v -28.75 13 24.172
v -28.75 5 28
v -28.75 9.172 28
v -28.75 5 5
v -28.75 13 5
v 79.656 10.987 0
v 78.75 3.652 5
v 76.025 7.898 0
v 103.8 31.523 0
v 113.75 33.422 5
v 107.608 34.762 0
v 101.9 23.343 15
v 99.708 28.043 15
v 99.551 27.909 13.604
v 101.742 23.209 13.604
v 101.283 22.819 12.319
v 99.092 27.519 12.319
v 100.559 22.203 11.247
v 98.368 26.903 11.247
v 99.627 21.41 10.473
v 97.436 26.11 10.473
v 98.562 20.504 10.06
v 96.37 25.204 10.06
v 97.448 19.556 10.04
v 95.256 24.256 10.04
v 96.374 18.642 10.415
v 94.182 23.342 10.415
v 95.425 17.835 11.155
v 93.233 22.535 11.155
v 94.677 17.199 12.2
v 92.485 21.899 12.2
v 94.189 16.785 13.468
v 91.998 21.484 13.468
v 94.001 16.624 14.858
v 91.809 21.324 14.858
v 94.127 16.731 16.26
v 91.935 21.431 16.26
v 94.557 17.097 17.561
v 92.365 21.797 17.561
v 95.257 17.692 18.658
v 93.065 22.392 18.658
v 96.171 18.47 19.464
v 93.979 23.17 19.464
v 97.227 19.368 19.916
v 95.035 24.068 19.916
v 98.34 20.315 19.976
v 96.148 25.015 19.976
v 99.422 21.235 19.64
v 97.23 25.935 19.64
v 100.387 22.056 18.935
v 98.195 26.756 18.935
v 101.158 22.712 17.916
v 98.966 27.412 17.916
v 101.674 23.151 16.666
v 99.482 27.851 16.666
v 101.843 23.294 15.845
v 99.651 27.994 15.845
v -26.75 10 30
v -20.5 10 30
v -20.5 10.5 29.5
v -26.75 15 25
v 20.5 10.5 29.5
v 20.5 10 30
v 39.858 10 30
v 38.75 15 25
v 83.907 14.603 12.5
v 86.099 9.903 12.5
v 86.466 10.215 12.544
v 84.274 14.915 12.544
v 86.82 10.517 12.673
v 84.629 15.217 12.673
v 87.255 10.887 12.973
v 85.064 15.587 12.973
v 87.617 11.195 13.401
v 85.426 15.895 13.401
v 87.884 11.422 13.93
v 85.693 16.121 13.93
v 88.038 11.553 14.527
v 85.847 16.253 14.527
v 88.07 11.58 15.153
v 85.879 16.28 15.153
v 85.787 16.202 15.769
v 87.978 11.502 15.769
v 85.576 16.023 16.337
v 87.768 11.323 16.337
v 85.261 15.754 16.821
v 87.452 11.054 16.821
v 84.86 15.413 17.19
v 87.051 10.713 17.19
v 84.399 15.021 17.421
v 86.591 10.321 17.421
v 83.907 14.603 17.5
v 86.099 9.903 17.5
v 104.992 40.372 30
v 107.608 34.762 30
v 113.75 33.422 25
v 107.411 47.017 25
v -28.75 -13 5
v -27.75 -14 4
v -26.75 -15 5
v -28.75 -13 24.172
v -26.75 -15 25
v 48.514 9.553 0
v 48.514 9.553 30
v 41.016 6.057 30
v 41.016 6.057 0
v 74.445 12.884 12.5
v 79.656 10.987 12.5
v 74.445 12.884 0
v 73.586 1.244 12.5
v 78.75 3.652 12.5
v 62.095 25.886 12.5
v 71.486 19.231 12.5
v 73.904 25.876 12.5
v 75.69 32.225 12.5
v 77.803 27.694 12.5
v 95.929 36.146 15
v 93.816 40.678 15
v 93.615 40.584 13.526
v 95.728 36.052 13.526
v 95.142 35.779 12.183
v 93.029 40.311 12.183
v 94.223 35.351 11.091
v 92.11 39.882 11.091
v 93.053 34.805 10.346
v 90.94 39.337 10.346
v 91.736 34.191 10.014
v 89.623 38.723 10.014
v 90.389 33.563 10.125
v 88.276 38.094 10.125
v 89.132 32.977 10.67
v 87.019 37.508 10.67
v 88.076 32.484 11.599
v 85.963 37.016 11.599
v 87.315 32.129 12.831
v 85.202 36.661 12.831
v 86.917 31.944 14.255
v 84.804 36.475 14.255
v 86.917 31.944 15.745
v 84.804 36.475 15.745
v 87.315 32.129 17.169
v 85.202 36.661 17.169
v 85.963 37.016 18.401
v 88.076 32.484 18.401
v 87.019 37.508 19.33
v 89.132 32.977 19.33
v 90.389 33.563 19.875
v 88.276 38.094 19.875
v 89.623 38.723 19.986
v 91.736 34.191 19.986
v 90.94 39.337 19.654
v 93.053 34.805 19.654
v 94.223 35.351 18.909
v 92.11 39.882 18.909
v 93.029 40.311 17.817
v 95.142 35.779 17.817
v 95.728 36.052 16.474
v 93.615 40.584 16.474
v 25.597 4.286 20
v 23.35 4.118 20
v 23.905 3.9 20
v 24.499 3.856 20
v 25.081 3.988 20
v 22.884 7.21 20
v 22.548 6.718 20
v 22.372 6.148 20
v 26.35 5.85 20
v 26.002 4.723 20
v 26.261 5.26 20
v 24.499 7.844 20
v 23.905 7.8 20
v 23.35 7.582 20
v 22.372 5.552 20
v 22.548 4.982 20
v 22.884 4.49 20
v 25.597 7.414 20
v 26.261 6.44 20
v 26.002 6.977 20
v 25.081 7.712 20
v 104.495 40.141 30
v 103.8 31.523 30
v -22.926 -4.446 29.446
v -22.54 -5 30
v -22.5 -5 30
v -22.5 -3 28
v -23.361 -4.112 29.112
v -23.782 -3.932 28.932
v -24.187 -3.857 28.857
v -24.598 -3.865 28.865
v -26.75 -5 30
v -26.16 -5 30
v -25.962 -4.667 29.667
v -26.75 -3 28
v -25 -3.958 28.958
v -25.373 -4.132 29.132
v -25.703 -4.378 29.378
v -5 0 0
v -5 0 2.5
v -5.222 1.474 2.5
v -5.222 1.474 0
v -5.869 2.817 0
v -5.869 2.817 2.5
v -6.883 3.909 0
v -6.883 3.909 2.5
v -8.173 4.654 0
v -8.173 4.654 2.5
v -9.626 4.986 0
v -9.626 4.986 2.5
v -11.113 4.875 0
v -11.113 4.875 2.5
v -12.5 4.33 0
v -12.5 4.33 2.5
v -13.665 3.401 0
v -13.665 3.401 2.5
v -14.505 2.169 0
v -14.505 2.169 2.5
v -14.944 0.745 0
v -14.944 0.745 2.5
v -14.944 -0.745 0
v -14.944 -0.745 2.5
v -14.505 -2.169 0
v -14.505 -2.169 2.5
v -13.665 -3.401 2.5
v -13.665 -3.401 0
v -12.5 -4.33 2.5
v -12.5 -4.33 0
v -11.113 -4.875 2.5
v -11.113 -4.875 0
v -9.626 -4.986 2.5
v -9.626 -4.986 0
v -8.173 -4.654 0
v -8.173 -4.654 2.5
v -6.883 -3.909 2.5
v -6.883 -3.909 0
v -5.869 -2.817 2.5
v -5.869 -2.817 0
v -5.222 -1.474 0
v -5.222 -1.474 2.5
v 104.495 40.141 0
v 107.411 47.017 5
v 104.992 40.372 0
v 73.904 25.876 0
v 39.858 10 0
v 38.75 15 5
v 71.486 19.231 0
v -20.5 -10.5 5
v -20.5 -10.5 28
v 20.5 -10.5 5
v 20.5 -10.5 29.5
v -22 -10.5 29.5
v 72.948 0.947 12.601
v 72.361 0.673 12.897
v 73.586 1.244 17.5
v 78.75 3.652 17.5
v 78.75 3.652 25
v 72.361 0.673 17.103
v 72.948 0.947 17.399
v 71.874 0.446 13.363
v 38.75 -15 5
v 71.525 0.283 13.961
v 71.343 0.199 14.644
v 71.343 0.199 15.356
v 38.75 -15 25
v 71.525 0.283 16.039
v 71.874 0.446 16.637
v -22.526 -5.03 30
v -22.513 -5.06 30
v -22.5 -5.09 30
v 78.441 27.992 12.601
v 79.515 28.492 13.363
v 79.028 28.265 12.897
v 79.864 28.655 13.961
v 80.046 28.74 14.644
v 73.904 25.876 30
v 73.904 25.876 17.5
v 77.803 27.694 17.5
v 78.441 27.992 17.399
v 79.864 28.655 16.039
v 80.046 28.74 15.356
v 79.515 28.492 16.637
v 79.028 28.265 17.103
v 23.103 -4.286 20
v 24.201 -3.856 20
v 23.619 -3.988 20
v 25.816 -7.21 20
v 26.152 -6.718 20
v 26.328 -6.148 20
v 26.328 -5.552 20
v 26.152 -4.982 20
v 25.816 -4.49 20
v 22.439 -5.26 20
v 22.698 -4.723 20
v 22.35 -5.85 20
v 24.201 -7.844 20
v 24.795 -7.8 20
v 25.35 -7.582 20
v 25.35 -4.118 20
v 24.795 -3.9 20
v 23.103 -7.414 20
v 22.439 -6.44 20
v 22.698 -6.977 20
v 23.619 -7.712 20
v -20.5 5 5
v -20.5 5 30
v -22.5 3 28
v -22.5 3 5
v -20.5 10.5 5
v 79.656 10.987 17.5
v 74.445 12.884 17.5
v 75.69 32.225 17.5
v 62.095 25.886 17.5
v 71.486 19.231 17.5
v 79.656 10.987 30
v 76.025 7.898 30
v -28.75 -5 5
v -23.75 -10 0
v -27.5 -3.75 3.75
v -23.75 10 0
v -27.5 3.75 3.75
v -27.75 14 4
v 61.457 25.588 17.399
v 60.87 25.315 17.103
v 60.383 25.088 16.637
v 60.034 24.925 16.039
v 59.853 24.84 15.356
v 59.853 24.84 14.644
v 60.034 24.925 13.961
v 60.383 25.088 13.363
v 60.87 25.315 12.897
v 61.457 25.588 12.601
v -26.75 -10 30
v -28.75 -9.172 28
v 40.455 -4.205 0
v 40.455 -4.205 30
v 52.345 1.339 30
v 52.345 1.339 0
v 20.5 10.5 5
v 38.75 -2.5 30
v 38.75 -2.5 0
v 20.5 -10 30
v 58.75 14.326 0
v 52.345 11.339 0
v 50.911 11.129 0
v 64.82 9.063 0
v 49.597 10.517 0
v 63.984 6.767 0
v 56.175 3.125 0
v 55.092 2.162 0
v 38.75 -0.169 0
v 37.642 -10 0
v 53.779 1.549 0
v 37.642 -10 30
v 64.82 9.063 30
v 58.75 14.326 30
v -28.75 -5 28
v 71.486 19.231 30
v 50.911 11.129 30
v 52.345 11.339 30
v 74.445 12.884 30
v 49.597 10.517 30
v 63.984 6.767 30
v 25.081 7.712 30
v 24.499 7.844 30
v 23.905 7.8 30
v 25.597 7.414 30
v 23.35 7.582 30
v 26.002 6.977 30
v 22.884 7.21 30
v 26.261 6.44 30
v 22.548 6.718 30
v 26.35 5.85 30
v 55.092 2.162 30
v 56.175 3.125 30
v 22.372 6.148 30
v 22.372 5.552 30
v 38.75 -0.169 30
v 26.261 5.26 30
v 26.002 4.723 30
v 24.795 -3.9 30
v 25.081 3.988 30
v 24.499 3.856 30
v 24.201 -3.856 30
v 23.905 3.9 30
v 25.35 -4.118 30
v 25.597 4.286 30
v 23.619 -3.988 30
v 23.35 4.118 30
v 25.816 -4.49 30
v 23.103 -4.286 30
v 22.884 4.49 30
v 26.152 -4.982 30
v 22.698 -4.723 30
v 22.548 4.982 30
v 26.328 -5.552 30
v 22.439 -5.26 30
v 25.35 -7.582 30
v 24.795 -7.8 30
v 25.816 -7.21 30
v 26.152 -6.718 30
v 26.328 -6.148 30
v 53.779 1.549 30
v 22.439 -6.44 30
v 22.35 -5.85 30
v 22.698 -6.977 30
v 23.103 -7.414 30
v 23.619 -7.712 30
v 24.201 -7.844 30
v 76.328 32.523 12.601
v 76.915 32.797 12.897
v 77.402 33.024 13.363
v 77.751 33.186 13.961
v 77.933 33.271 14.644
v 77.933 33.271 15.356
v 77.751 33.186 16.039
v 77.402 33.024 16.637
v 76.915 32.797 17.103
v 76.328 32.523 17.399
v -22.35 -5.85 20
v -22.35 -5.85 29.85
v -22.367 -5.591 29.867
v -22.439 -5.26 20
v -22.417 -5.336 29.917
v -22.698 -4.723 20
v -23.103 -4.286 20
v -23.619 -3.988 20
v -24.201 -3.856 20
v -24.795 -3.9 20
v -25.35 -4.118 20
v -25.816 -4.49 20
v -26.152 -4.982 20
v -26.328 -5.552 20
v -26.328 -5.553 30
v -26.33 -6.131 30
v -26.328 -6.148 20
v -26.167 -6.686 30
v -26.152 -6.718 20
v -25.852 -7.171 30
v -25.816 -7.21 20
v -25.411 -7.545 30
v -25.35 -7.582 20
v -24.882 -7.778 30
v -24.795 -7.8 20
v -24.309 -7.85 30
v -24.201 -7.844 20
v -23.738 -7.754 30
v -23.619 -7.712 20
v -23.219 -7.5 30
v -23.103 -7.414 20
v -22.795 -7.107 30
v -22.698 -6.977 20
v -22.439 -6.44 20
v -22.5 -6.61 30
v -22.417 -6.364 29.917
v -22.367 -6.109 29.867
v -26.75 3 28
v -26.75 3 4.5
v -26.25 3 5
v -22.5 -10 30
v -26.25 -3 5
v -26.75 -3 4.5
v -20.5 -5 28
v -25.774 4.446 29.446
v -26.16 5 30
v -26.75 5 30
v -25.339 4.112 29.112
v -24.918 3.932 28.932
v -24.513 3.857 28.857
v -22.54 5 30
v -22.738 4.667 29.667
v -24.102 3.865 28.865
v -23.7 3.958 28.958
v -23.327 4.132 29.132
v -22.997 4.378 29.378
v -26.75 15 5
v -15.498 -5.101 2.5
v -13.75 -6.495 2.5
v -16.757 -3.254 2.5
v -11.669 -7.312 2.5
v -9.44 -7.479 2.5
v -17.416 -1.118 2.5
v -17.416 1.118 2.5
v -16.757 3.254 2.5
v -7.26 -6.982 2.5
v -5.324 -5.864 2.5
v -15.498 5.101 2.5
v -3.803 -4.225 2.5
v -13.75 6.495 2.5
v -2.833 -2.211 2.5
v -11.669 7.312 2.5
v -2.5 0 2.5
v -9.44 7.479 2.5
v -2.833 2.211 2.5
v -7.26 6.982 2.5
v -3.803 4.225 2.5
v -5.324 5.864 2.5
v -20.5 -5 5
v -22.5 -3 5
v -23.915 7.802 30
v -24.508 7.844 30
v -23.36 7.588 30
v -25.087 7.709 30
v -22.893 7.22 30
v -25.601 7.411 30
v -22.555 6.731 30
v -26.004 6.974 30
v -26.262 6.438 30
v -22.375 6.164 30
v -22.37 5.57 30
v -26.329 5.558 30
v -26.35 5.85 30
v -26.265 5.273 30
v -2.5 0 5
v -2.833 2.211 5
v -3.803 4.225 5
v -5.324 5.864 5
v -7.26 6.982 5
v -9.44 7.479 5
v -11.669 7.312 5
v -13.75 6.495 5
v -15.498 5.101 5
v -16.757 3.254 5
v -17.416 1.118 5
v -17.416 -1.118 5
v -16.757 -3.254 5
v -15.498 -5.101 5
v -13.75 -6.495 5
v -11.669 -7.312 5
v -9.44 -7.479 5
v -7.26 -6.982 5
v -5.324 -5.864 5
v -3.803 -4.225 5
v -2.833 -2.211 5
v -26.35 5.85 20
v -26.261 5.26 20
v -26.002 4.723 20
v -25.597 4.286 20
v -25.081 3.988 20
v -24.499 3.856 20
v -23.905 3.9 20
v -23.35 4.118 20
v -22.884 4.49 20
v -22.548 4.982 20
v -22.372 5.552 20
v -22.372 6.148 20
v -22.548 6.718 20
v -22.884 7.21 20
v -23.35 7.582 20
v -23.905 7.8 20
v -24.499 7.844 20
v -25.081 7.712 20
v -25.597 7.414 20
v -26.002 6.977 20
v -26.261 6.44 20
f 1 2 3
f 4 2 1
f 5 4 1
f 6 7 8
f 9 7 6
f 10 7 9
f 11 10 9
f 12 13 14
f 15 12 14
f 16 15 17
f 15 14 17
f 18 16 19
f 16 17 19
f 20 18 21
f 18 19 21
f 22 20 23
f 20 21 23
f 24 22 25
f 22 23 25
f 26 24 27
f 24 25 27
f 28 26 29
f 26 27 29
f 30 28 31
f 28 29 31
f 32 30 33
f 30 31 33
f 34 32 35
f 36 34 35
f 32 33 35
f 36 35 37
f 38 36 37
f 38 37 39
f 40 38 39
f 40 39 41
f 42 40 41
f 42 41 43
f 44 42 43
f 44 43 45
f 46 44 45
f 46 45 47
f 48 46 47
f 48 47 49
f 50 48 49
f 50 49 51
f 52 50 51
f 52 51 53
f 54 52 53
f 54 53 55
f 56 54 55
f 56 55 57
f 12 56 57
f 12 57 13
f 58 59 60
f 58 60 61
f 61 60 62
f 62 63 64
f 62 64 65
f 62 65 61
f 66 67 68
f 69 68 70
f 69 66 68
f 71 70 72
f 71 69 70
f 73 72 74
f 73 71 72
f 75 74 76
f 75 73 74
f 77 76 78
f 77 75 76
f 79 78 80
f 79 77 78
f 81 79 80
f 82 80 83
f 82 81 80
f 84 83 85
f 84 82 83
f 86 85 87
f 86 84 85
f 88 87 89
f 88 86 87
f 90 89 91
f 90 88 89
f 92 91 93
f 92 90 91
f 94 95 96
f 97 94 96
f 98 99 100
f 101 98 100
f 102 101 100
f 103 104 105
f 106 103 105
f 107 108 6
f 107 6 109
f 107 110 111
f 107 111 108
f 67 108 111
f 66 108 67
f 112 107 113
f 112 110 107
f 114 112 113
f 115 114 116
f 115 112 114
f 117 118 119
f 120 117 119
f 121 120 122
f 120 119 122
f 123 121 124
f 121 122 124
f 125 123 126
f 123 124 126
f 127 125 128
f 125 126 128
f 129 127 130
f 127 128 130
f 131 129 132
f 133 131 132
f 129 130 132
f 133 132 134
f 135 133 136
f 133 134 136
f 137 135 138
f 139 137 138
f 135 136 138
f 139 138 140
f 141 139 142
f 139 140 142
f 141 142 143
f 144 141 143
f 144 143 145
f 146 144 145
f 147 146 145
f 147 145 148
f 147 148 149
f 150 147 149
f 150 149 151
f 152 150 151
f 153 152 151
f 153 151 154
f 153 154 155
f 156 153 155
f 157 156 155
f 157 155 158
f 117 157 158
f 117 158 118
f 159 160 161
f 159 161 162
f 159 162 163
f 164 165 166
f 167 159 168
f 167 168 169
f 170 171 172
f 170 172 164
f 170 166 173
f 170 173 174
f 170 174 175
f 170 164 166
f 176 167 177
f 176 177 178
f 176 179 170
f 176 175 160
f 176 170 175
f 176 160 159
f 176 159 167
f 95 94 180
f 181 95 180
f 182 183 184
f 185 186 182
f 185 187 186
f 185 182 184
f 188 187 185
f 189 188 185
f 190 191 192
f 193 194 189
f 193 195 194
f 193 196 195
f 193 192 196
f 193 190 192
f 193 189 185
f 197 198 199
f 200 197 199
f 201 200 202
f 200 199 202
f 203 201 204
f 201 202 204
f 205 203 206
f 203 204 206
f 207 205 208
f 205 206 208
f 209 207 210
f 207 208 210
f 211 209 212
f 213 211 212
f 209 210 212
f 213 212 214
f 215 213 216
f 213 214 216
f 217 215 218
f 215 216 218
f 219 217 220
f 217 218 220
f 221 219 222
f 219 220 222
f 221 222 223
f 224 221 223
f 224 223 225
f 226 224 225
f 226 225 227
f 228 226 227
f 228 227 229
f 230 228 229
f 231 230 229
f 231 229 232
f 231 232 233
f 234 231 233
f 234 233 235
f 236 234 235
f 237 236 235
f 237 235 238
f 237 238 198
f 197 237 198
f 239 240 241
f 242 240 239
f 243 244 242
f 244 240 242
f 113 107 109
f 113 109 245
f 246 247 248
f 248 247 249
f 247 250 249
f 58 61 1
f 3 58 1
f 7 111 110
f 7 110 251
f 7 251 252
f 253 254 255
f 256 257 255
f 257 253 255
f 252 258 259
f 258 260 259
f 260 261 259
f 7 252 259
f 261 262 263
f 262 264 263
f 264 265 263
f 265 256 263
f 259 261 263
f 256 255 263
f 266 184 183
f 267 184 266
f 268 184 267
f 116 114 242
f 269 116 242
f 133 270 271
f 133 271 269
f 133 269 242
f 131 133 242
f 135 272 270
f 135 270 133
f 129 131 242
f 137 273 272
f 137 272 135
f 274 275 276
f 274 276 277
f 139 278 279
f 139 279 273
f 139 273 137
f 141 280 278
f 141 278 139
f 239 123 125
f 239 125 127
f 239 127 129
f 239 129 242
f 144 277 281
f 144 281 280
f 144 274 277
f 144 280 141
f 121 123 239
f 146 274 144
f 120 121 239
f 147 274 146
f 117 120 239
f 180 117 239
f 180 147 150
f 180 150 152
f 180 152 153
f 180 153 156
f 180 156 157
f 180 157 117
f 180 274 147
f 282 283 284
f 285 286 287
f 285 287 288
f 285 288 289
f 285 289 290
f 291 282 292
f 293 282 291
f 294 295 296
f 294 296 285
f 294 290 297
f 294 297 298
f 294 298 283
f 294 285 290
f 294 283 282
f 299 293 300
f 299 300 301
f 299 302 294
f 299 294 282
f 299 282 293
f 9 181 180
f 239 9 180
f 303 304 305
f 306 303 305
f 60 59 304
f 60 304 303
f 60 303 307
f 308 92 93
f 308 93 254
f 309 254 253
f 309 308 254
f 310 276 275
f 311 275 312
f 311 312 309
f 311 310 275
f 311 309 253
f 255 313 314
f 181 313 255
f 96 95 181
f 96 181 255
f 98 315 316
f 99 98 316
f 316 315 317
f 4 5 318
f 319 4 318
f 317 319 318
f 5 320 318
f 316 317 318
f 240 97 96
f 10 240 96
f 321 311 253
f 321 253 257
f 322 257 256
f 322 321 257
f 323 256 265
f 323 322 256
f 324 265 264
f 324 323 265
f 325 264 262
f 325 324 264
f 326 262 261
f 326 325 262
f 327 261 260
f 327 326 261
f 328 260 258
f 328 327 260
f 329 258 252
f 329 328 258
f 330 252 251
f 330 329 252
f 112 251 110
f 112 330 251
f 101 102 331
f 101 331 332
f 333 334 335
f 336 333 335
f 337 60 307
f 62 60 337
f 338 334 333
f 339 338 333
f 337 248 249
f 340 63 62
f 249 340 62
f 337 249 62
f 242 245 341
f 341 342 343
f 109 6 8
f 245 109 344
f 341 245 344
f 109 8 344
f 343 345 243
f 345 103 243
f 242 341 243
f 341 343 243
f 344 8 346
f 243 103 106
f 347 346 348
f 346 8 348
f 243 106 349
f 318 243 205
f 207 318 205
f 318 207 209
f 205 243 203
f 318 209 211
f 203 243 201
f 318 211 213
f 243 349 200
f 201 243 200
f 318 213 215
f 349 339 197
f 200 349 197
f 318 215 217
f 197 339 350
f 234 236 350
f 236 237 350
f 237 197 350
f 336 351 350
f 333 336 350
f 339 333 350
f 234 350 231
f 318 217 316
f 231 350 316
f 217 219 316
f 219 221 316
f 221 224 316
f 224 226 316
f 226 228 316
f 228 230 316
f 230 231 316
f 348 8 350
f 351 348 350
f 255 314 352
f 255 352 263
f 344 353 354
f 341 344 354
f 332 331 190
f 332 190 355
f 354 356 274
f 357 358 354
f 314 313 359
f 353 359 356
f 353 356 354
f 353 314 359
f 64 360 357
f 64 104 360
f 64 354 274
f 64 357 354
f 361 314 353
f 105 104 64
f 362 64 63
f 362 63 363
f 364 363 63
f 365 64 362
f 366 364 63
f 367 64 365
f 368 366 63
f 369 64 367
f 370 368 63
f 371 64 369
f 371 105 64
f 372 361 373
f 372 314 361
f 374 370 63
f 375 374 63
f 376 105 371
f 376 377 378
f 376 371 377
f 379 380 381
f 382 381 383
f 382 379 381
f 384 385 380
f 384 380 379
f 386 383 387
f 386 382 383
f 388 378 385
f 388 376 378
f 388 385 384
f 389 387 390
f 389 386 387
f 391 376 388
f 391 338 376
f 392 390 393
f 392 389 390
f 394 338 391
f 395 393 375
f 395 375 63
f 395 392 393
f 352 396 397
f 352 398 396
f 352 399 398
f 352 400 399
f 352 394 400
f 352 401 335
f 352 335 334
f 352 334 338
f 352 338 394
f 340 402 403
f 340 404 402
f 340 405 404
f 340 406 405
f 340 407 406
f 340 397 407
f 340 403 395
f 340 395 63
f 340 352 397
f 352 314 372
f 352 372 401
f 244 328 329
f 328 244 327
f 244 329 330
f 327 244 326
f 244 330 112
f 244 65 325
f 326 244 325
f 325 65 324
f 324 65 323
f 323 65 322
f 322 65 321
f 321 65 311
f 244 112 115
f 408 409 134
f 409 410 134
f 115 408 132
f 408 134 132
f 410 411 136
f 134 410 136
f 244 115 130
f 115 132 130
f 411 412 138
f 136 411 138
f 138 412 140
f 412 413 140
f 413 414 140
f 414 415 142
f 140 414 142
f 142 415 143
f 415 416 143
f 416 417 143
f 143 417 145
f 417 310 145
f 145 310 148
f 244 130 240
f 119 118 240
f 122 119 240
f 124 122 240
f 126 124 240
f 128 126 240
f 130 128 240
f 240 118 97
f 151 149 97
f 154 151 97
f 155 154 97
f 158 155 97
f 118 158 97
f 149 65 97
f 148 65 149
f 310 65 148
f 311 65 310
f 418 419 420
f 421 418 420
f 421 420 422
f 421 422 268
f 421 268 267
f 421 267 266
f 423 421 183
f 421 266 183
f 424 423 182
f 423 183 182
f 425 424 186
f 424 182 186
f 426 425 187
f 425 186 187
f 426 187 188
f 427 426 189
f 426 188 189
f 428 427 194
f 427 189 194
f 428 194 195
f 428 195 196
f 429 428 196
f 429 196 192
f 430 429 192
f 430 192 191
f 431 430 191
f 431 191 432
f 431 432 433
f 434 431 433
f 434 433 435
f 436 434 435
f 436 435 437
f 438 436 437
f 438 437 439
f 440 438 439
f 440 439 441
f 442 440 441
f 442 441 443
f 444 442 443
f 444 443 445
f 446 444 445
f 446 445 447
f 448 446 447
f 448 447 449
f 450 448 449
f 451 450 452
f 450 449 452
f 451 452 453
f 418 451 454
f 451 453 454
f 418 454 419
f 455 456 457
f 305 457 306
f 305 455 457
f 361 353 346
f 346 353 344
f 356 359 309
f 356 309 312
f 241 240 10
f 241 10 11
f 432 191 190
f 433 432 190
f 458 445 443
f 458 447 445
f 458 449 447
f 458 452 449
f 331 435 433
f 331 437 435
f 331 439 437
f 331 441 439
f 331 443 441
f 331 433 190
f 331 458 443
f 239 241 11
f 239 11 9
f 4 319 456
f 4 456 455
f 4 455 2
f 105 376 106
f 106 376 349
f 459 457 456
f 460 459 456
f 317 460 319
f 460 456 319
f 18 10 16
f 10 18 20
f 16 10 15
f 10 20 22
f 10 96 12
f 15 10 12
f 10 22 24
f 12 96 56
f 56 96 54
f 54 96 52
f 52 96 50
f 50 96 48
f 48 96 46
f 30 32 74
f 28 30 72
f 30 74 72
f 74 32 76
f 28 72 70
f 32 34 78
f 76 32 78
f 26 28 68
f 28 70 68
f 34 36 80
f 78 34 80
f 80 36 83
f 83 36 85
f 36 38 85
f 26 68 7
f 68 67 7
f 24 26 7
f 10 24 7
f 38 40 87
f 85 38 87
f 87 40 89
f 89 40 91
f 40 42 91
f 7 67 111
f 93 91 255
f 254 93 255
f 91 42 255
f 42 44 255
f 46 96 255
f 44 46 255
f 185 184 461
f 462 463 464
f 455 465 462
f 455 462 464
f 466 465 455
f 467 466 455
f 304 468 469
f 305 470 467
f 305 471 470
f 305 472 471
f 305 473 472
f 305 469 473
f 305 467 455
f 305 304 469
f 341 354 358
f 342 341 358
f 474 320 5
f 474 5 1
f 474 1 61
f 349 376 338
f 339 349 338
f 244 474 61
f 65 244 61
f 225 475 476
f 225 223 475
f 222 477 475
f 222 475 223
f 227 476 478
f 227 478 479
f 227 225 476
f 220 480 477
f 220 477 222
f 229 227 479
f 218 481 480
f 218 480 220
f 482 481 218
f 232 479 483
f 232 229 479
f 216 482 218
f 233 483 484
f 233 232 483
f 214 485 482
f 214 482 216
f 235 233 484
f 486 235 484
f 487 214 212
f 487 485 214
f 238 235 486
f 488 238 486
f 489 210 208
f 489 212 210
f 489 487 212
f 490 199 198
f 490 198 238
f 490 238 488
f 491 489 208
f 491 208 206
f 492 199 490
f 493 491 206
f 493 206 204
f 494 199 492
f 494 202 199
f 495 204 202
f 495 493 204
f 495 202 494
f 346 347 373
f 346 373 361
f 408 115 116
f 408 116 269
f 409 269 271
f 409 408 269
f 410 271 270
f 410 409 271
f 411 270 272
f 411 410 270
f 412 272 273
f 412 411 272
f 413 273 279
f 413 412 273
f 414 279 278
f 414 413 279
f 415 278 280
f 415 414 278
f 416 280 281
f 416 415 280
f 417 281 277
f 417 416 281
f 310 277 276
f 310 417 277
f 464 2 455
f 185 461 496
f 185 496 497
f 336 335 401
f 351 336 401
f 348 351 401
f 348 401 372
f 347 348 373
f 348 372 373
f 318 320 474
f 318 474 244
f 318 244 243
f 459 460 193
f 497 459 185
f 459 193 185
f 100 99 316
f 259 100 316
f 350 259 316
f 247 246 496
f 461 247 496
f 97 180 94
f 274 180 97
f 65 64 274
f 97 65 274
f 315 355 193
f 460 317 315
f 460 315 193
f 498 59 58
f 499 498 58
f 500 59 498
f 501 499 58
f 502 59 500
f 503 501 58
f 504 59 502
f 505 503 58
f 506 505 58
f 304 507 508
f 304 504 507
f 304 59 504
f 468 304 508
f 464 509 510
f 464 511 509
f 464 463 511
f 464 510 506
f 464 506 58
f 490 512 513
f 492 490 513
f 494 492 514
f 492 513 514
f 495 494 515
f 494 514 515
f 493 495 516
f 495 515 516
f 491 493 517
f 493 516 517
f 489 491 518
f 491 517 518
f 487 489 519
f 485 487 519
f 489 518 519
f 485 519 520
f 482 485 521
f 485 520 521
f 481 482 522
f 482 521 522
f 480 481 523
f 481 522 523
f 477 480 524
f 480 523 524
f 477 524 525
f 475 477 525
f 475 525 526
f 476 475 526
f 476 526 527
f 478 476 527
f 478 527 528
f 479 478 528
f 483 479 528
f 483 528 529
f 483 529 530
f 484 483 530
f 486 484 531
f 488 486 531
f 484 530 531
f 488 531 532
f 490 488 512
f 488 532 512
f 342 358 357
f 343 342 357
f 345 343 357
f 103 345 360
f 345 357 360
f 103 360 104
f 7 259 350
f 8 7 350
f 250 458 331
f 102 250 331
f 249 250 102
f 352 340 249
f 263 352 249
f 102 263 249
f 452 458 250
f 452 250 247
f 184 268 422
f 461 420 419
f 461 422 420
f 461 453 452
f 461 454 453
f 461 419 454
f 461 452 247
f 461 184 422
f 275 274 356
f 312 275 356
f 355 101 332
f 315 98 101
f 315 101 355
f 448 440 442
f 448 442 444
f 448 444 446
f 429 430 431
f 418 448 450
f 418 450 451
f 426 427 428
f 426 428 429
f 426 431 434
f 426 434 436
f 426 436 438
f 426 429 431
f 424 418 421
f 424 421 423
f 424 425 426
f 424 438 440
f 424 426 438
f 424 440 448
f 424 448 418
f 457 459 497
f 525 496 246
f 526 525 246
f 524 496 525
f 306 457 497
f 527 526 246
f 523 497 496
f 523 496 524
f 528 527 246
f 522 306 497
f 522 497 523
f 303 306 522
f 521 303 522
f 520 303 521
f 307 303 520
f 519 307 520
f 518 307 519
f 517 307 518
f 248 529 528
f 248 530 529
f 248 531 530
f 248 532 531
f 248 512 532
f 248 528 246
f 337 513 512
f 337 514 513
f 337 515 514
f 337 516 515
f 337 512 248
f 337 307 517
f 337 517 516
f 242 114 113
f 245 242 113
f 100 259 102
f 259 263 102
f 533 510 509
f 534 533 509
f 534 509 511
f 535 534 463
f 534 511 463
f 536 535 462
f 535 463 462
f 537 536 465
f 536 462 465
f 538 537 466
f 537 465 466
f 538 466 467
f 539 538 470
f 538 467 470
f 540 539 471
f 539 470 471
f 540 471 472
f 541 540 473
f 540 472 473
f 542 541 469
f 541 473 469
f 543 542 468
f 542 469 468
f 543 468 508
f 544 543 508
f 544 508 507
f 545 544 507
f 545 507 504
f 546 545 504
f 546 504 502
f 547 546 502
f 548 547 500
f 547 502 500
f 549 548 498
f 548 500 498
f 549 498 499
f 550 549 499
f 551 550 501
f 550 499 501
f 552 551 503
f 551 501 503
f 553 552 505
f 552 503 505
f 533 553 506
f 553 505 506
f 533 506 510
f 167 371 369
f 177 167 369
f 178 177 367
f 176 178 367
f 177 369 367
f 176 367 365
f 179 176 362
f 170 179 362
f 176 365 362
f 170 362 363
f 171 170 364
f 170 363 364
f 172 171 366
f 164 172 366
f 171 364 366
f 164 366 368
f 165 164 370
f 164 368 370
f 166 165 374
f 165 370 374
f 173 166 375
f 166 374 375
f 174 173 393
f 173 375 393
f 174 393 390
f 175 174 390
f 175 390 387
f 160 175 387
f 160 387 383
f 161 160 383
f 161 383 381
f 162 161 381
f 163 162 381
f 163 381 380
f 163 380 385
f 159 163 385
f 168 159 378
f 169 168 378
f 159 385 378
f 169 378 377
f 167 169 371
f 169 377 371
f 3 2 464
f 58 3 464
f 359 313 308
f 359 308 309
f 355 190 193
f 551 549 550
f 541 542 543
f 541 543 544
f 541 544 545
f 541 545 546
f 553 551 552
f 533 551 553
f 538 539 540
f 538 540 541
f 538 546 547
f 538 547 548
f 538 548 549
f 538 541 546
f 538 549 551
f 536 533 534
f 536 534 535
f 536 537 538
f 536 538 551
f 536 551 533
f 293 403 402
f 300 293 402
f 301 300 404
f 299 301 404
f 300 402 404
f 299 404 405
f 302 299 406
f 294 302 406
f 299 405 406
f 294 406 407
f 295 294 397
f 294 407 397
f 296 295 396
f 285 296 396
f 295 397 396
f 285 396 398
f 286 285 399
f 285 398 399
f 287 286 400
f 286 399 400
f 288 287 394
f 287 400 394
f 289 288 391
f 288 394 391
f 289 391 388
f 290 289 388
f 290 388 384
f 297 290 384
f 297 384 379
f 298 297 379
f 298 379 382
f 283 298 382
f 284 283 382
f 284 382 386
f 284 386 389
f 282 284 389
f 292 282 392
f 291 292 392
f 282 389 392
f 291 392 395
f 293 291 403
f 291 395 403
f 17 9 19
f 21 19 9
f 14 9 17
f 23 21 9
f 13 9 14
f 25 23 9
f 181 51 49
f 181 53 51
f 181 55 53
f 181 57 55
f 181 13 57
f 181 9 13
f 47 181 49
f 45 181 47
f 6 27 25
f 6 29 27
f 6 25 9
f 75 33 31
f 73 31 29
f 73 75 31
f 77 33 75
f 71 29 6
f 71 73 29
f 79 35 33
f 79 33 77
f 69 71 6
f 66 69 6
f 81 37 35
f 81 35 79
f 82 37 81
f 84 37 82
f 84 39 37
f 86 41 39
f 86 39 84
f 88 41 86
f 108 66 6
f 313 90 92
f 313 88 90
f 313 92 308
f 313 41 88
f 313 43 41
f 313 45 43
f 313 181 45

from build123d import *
from OCP.BRepFilletAPI import BRepFilletAPI_MakeChamfer

# Parameters (mm, degrees)
SKETCH1_W           = 57.5
SKETCH1_H           = 30
BOSS_EXTRUDE1_DEPTH = 30
SKETCH2_W           = 41
SKETCH2_H           = 21
CUT_EXTRUDE1_DEPTH  = 25
SKETCH8_R           = 2
CUT_EXTRUDE6_DEPTH  = 10
SKETCH9_W           = 8.25
SKETCH9_H           = 6
CUT_EXTRUDE7_DEPTH  = 25
SKETCH10_R          = 5
CUT_EXTRUDE8_DEPTH  = 10
BOSS_EXTRUDE4_DEPTH = 30
CUT_EXTRUDE9_DEPTH  = 30
CHAMFER3_SIZE       = 5
CHAMFER3_SIZE_2     = 7.15419636
CHAMFER3_SIZE_3     = 4.066852786
SKETCH16_R          = 5
CUT_EXTRUDE10_DEPTH = 30
CHAMFER5_SIZE       = 5
CHAMFER6_SIZE       = 2
CHAMFER7_SIZE       = 2.5
CHAMFER7_SIZE_2     = 1.767766953
CHAMFER8_SIZE       = 2.5
CHAMFER8_SIZE2      = 1.892599607
CHAMFER8_SIZE2_2    = 1.881218298
CHAMFER8_SIZE2_3    = 5.168604796
SKETCH19_R          = 5
CUT_EXTRUDE12_DEPTH = 30
SKETCH20_R          = 7.5
CUT_EXTRUDE13_DEPTH = 2.5


with BuildPart() as part:
    # Sketch1 → Boss-Extrude1 (new body)
    with BuildSketch(Plane.XY):
        Rectangle(SKETCH1_W, SKETCH1_H)
    extrude(amount=BOSS_EXTRUDE1_DEPTH)

    # Sketch2 → Cut-Extrude1 (cut)
    with BuildSketch(Plane.XY.offset(30)):
        Rectangle(SKETCH2_W, SKETCH2_H)
    extrude(amount=-CUT_EXTRUDE1_DEPTH, mode=Mode.SUBTRACT)

    # Sketch8 → Cut-Extrude6 (cut)
    with BuildSketch(Plane.XY.offset(30)):
        with Locations((24.35, 5.85)):
            Circle(SKETCH8_R)
        with Locations(Location((24.35, -5.85, 0), (0, 0, 180))):
            Circle(SKETCH8_R)
        with Locations((-24.35, -5.85)):
            Circle(SKETCH8_R)
        with Locations(Location((-24.35, 5.85, 0), (0, 0, 180))):
            Circle(SKETCH8_R)
    extrude(amount=-CUT_EXTRUDE6_DEPTH, mode=Mode.SUBTRACT)

    # Sketch9 → Cut-Extrude7 (cut)
    with BuildSketch(Plane.XY.offset(30)):
        with Locations((-24.625, 0)):
            Rectangle(SKETCH9_W, SKETCH9_H)
    extrude(amount=-CUT_EXTRUDE7_DEPTH, mode=Mode.SUBTRACT)

    # Sketch10 → Cut-Extrude8 (cut)
    with BuildSketch(Plane.XY.offset(5)):
        with Locations((-10, 0)):
            Circle(SKETCH10_R)
    extrude(amount=-CUT_EXTRUDE8_DEPTH, mode=Mode.SUBTRACT)

    # Sketch13 → Boss-Extrude4 (add)
    with BuildSketch(Plane.XY.offset(30)):
        Polygon((28.75, 15), (38.75, 15), (107.410726074, 47.017022383), (113.75, 33.422405577), (78.75, 3.652306326), (38.75, -15), (28.75, -15), align=None)
    extrude(amount=-BOSS_EXTRUDE4_DEPTH)

    # Sketch15 → Cut-Extrude9 (cut)
    with BuildSketch(Plane.XY.offset(30)):
        Polygon((38.75, 5), (38.75, 0), (38.75, -5), (66.25, 7.823460599), (58.75, 14.326153163), align=None)
        Polygon((76.558385836, 8.352238067), (69.372424662, 23.762581536), (104.992278447, 40.372392139), (107.608239852, 34.762444803), align=None)
    extrude(amount=-CUT_EXTRUDE9_DEPTH, mode=Mode.SUBTRACT)

    # Chamfer3
    # the kernel refuses this chamfer: 7.15419636, 5, 4.066852786 mm, written as the material it adds along each edge
    with BuildSketch(Plane(origin=(107.608239852, 34.762444803, 30), x_dir=(-0.7359660221939145, -0.6770184740286387, 0), z_dir=(0, 0, -1))) as chamfer3_piece_1:
        Polygon((CHAMFER3_SIZE * 0.999244403531, CHAMFER3_SIZE * 0.0388667211355), (-CHAMFER3_SIZE_2 * 0.302554433968, CHAMFER3_SIZE_2 * 0.953132107531), (0, 0), align=None)
    extrude(amount=30)
    with BuildSketch(Plane(origin=(69.372424662, 23.762581536, 30), x_dir=(0.8943448678110075, 0.4473782040065334, 0), z_dir=(0, 0, -1))) as chamfer3_piece_2:
        Polygon((CHAMFER3_SIZE * 0.999621916911, CHAMFER3_SIZE * 0.0274958766106), (-CHAMFER3_SIZE * 0.0274958766106, CHAMFER3_SIZE * 0.999621916911), (0, 0), align=None)
    extrude(amount=30)
    with BuildSketch(Plane(origin=(76.558385836, 8.352238067, 30), x_dir=(0.7880798878250118, 0.615572977319275, 0), z_dir=(0, 0, -1))) as chamfer3_piece_3:
        Polygon((CHAMFER3_SIZE_3 * 0.999130074634, -CHAMFER3_SIZE_3 * 0.0417024478214), (CHAMFER3_SIZE * 0.224841630528, -CHAMFER3_SIZE * 0.974395320792), (0, 0), align=None)
    extrude(amount=30)

    # Sketch16 → Cut-Extrude10 (cut)
    with BuildSketch(Plane(origin=(1.175656739, -2.521204013, 0), x_dir=(0.9063077870366488, 0.42261826174070183, 0), z_dir=(-0.42261826174070183, 0.9063077870366488, 0))):
        with Locations((97.217429724, -15)):
            Circle(SKETCH16_R)
        with BuildLine():
            Line((67.217429724, -12.5), (82.217429724, -12.5))
            ThreePointArc((82.217429724, -12.5), (84.717429724, -15), (82.217429724, -17.5))
            Line((82.217429724, -17.5), (67.217429724, -17.5))
            ThreePointArc((67.217429724, -17.5), (64.717429724, -15), (67.217429724, -12.5))
        make_face()
    extrude(amount=-CUT_EXTRUDE10_DEPTH, mode=Mode.SUBTRACT)

    # Chamfer5
    # the kernel refuses this chamfer: 5 mm, written as the material it takes off along each edge
    with BuildSketch(Plane(origin=(-28.75, 27.85841494, 0), x_dir=(-0.027495876610586313, 0, 0.9996219169112968), z_dir=(0, -1, 0))) as chamfer5_piece_1:
        Polygon((CHAMFER5_SIZE * 0.999621916911, -CHAMFER5_SIZE * 0.0274958766106), (-CHAMFER5_SIZE * 0.0274958766106, -CHAMFER5_SIZE * 0.999621916911), (0, 0), align=None)
    extrude(amount=55.71682988, mode=Mode.SUBTRACT)
    with BuildSketch(Plane(origin=(-41.60841494, -15, 0), x_dir=(0, -0.027495876610586317, 0.9996219169112968), z_dir=(1, 0, 0))) as chamfer5_piece_2:
        Polygon((CHAMFER5_SIZE * 0.999621916911, -CHAMFER5_SIZE * 0.0274958766106), (-CHAMFER5_SIZE * 0.0274958766106, -CHAMFER5_SIZE * 0.999621916911), (0, 0), align=None)
    extrude(amount=93.21682988, mode=Mode.SUBTRACT)
    with BuildSketch(Plane(origin=(90.403681589, 9.086507297, 30), x_dir=(-0.4224584769229525, 0.905965127389214, 0.02749587661058635), z_dir=(-0.9063077870366526, -0.4226182617406939, 0)), Plane(origin=(90.403681589, 9.086507297, 0), x_dir=(0.01162025957820246, -0.02491972708357306, 0.9996219169112968), z_dir=(-0.9063077870366526, -0.4226182617406939, 0))) as chamfer5_piece_3:
        Polygon((CHAMFER5_SIZE * 0.999621916911, CHAMFER5_SIZE * 0.0274958766106), (-CHAMFER5_SIZE * 0.0274958766106, CHAMFER5_SIZE * 0.999621916911), (0, 0), align=None)
    extrude(amount=69.851946638, mode=Mode.SUBTRACT)
    with BuildSketch(Plane(origin=(123.544555766, 41.753402643, 0), x_dir=(0.017814642661908332, -0.02094425308797373, 0.9996219169112968), z_dir=(-0.7617234170999287, -0.6479023351104763, 0)), Plane(origin=(123.544555766, 41.753402643, 30), x_dir=(-0.6476573741944397, 0.7614354223576539, 0.027495876610586372), z_dir=(-0.7617234170999287, -0.6479023351104763, 0))) as chamfer5_piece_4:
        Polygon((CHAMFER5_SIZE * 0.999621916911, CHAMFER5_SIZE * 0.0274958766106), (-CHAMFER5_SIZE * 0.0274958766106, CHAMFER5_SIZE * 0.999621916911), (0, 0), align=None)
    extrude(amount=71.665266299, mode=Mode.SUBTRACT)
    with BuildSketch(Plane(origin=(101.976525103, 58.670703972, 30), x_dir=(-0.9059651273892108, -0.42245847692295924, 0.027495876610586337), z_dir=(0.42261826174070055, -0.9063077870366495, 0)), Plane(origin=(101.976525103, 58.670703972, 0), x_dir=(0.024919727083572332, 0.011620259578202343, 0.9996219169112968), z_dir=(0.42261826174070055, -0.9063077870366495, 0))) as chamfer5_piece_5:
        Polygon((CHAMFER5_SIZE * 0.999621916911, CHAMFER5_SIZE * 0.0274958766106), (-CHAMFER5_SIZE * 0.0274958766106, CHAMFER5_SIZE * 0.999621916911), (0, 0), align=None)
    extrude(amount=40.71682988, mode=Mode.SUBTRACT)
    with BuildSketch(Plane(origin=(27.096318411, 9.565799029, 30), x_dir=(0.4224584769229604, -0.9059651273892103, 0.027495876610586324), z_dir=(0.9063077870366489, 0.4226182617407018, 0))) as chamfer5_piece_6_section:
        Polygon((CHAMFER5_SIZE * 0.999621916911, CHAMFER5_SIZE * 0.0274958766106), (-CHAMFER5_SIZE * 0.0274958766106, CHAMFER5_SIZE * 0.999621916911), (0, 0), align=None)
    chamfer5_piece_6 = extrude(amount=101.47555893, mode=Mode.PRIVATE)
    chamfer5_piece_6 = split(chamfer5_piece_6, bisect_by=Plane(origin=(81.150743587, 15, 28.329639499), z_dir=(0, 1, 0)), keep=Keep.TOP, mode=Mode.PRIVATE)
    add(chamfer5_piece_6, mode=Mode.SUBTRACT)
    with BuildSketch(Plane(origin=(27.096318411, 9.565799029, 0), x_dir=(-0.011620259578202905, 0.02491972708357345, 0.9996219169112968), z_dir=(0.9063077870366489, 0.4226182617407018, 0))) as chamfer5_piece_7_section:
        Polygon((CHAMFER5_SIZE * 0.999621916911, CHAMFER5_SIZE * 0.0274958766106), (-CHAMFER5_SIZE * 0.0274958766106, CHAMFER5_SIZE * 0.999621916911), (0, 0), align=None)
    chamfer5_piece_7 = extrude(amount=101.47555893, mode=Mode.PRIVATE)
    chamfer5_piece_7 = split(chamfer5_piece_7, bisect_by=Plane(origin=(81.150743587, 15, 1.670360501), z_dir=(0, 1, 0)), keep=Keep.TOP, mode=Mode.PRIVATE)
    add(chamfer5_piece_7, mode=Mode.SUBTRACT)
    with BuildSketch(Plane(origin=(-41.60841494, 15, 0), x_dir=(0, 0.027495876610586317, 0.9996219169112968), z_dir=(1, 0, 0))) as chamfer5_piece_8_section:
        Polygon((CHAMFER5_SIZE * 0.999621916911, CHAMFER5_SIZE * 0.0274958766106), (-CHAMFER5_SIZE * 0.0274958766106, CHAMFER5_SIZE * 0.999621916911), (0, 0), align=None)
    chamfer5_piece_8 = extrude(amount=93.21682988, mode=Mode.PRIVATE)
    chamfer5_piece_8 = split(chamfer5_piece_8, bisect_by=Plane(origin=(3.719146846, -1.335155097, 1.672660276), z_dir=(-0.4226182617407018, 0.9063077870366489, 0)), keep=Keep.TOP, mode=Mode.PRIVATE)
    add(chamfer5_piece_8, mode=Mode.SUBTRACT)
    with BuildSketch(Plane(origin=(51.60841494, -15, 30), x_dir=(0, 0.9996219169112968, 0.027495876610586355), z_dir=(-1, 0, 0))) as chamfer5_piece_9:
        Polygon((CHAMFER5_SIZE * 0.999621916911, CHAMFER5_SIZE * 0.0274958766106), (-CHAMFER5_SIZE * 0.0274958766106, CHAMFER5_SIZE * 0.999621916911), (0, 0), align=None)
    extrude(amount=93.21682988, mode=Mode.SUBTRACT)
    with BuildSketch(Plane(origin=(51.60841494, 15, 30), x_dir=(0, -0.9996219169112968, 0.02749587661058629), z_dir=(-1, 0, 0))) as chamfer5_piece_10_section:
        Polygon((CHAMFER5_SIZE * 0.999621916911, -CHAMFER5_SIZE * 0.0274958766106), (-CHAMFER5_SIZE * 0.0274958766106, -CHAMFER5_SIZE * 0.999621916911), (0, 0), align=None)
    chamfer5_piece_10 = extrude(amount=93.21682988, mode=Mode.PRIVATE)
    chamfer5_piece_10 = split(chamfer5_piece_10, bisect_by=Plane(origin=(3.719146846, -1.335155097, 28.327339724), z_dir=(-0.4226182617407018, 0.9063077870366489, 0)), keep=Keep.TOP, mode=Mode.PRIVATE)
    add(chamfer5_piece_10, mode=Mode.SUBTRACT)
    with BuildSketch(Plane(origin=(27.096318411, 9.565799029, 30), x_dir=(0.4224584769229604, -0.9059651273892103, 0.027495876610586324), z_dir=(0.9063077870366489, 0.4226182617407018, 0))) as chamfer5_piece_11a_section:
        Polygon((CHAMFER5_SIZE * 0.999621916911, CHAMFER5_SIZE * 0.0274958766106), (-CHAMFER5_SIZE * 0.0274958766106, CHAMFER5_SIZE * 0.999621916911), (0, 0), align=None)
    chamfer5_piece_11a = extrude(amount=101.47555893, mode=Mode.PRIVATE)
    chamfer5_piece_11a = split(chamfer5_piece_11a, bisect_by=Plane(origin=(35.512062488, 15, 28.462048788), z_dir=(0, -1, 0)), keep=Keep.TOP, mode=Mode.PRIVATE)
    with BuildSketch(Plane(origin=(51.60841494, 15, 30), x_dir=(0, -0.9996219169112968, 0.02749587661058629), z_dir=(-1, 0, 0))) as chamfer5_piece_11b_section:
        Polygon((CHAMFER5_SIZE * 0.999621916911, -CHAMFER5_SIZE * 0.0274958766106), (-CHAMFER5_SIZE * 0.0274958766106, -CHAMFER5_SIZE * 0.999621916911), (0, 0), align=None)
    chamfer5_piece_11b = extrude(amount=93.21682988, mode=Mode.PRIVATE)
    chamfer5_piece_11b = split(chamfer5_piece_11b, bisect_by=Plane(origin=(41.684567981, 16.368411523, 28.462048788), z_dir=(0.4226182617407018, -0.9063077870366489, 0)), keep=Keep.TOP, mode=Mode.PRIVATE)
    chamfer5_piece_11 = chamfer5_piece_11a & chamfer5_piece_11b
    add(chamfer5_piece_11, mode=Mode.SUBTRACT)
    with BuildSketch(Plane(origin=(27.096318411, 9.565799029, 0), x_dir=(-0.011620259578202905, 0.02491972708357345, 0.9996219169112968), z_dir=(0.9063077870366489, 0.4226182617407018, 0))) as chamfer5_piece_12a_section:
        Polygon((CHAMFER5_SIZE * 0.999621916911, CHAMFER5_SIZE * 0.0274958766106), (-CHAMFER5_SIZE * 0.0274958766106, CHAMFER5_SIZE * 0.999621916911), (0, 0), align=None)
    chamfer5_piece_12a = extrude(amount=101.47555893, mode=Mode.PRIVATE)
    chamfer5_piece_12a = split(chamfer5_piece_12a, bisect_by=Plane(origin=(35.512062488, 15, 1.537951212), z_dir=(0, -1, 0)), keep=Keep.TOP, mode=Mode.PRIVATE)
    with BuildSketch(Plane(origin=(-41.60841494, 15, 0), x_dir=(0, 0.027495876610586317, 0.9996219169112968), z_dir=(1, 0, 0))) as chamfer5_piece_12b_section:
        Polygon((CHAMFER5_SIZE * 0.999621916911, CHAMFER5_SIZE * 0.0274958766106), (-CHAMFER5_SIZE * 0.0274958766106, CHAMFER5_SIZE * 0.999621916911), (0, 0), align=None)
    chamfer5_piece_12b = extrude(amount=93.21682988, mode=Mode.PRIVATE)
    chamfer5_piece_12b = split(chamfer5_piece_12b, bisect_by=Plane(origin=(41.684567981, 16.368411523, 1.537951212), z_dir=(0.4226182617407018, -0.9063077870366489, 0)), keep=Keep.TOP, mode=Mode.PRIVATE)
    chamfer5_piece_12 = chamfer5_piece_12a & chamfer5_piece_12b
    add(chamfer5_piece_12, mode=Mode.SUBTRACT)

    # Chamfer6
    # the kernel refuses this chamfer: 2 mm, written as the material it takes off along each edge
    with BuildSketch(Plane(origin=(-21.833333333, -4.333333333, 28.666666667), x_dir=(0.7071067811865551, 2.5121479338940134e-15, -0.70710678118654), z_dir=(0.577350269189621, 0.5773502691896211, 0.5773502691896353)), Plane(origin=(-27.416666667, -4.333333333, 28.666666667), x_dir=(8.79251776862911e-15, 0.70710678118655, -0.7071067811865451), z_dir=(-0.5773502691896274, 0.5773502691896265, 0.5773502691896233))) as chamfer6_piece_1:
        Polygon((-1.414213562, -0.816496581), (1.414213562, -0.816496581), (0, 1.632993162), align=None)
    extrude(amount=2.540341184, mode=Mode.SUBTRACT)
    with BuildSketch(Plane(origin=(-27.416666667, 4.333333333, 28.666666667), x_dir=(-0.7071067811865468, 0.7071067811865483, 0), z_dir=(-0.5773502691896283, -0.577350269189627, 0.5773502691896221))) as chamfer6_piece_2:
        Polygon((-1.414213562, 0.816496581), (1.414213562, 0.816496581), (0, -1.632993162), align=None)
    extrude(amount=2.540341184, mode=Mode.SUBTRACT)
    with BuildSketch(Plane(origin=(-28.75, -15, -0.143365976), x_dir=(-0.027495876610585623, 0.9996219169112968, 0), z_dir=(0, 0, 1))) as chamfer6_piece_3:
        Polygon((CHAMFER6_SIZE * 0.999621916911, -CHAMFER6_SIZE * 0.0274958766106), (-CHAMFER6_SIZE * 0.0274958766106, -CHAMFER6_SIZE * 0.999621916911), (0, 0), align=None)
    extrude(amount=30.286731952, mode=Mode.SUBTRACT)
    with BuildSketch(Plane(origin=(-28.75, -6.36309104, 33.63690896), x_dir=(0.9996219169112968, -0.019442520806022014, 0.019442520806006464), z_dir=(0, -0.7071067811862648, -0.7071067811868302))) as chamfer6_piece_4:
        Polygon((CHAMFER6_SIZE * 0.999621916911, -CHAMFER6_SIZE * 0.0274958766106), (-CHAMFER6_SIZE * 0.0274958766106, -CHAMFER6_SIZE * 0.999621916911), (0, 0), align=None)
    extrude(amount=17.357799764, mode=Mode.SUBTRACT)
    with BuildSketch(Plane(origin=(-20.5, 2.143365976, 30), x_dir=(-0.9996219169112968, 0, 0.02749587661058522), z_dir=(0, -1, 0))) as chamfer6_piece_5_section:
        Polygon((CHAMFER6_SIZE * 0.999621916911, CHAMFER6_SIZE * 0.0274958766106), (-CHAMFER6_SIZE * 0.0274958766106, CHAMFER6_SIZE * 0.999621916911), (0, 0), align=None)
    chamfer6_piece_5 = extrude(amount=17.286731952, mode=Mode.PRIVATE)
    chamfer6_piece_5 = split(chamfer6_piece_5, bisect_by=Plane(origin=(-21.161947574, -10.5, 29.325063892), z_dir=(0, 1, 0)), keep=Keep.TOP, mode=Mode.PRIVATE)
    add(chamfer6_piece_5, mode=Mode.SUBTRACT)
    with BuildSketch(Plane(origin=(-28.75, 2.143365976, 30), x_dir=(0.9996219169112965, 0, 0.027495876610587746), z_dir=(0, -1, 0))) as chamfer6_piece_6:
        Polygon((CHAMFER6_SIZE * 0.999621916911, -CHAMFER6_SIZE * 0.0274958766106), (-CHAMFER6_SIZE * 0.0274958766106, -CHAMFER6_SIZE * 0.999621916911), (0, 0), align=None)
    extrude(amount=17.286731952, mode=Mode.SUBTRACT)
    with BuildSketch(Plane(origin=(-28.75, -3, 35.143365976), x_dir=(-0.027495876610585623, -0.9996219169112968, 0), z_dir=(0, 0, -1)), Plane(origin=(-20.5, 3, 35.143365976), x_dir=(0.027495876610585623, 0.9996219169112968, 0), z_dir=(0, 0, -1))) as chamfer6_piece_7:
        Polygon((CHAMFER6_SIZE * 0.999621916911, -CHAMFER6_SIZE * 0.0274958766106), (-CHAMFER6_SIZE * 0.0274958766106, -CHAMFER6_SIZE * 0.999621916911), (0, 0), align=None)
    extrude(amount=30.143365976, mode=Mode.SUBTRACT)
    with BuildSketch(Plane(origin=(-20.5, -3, 35.143365976), x_dir=(0.027495876610585623, -0.9996219169112968, 0), z_dir=(0, 0, -1)), Plane(origin=(-28.75, 3, 35.143365976), x_dir=(-0.027495876610585623, 0.9996219169112968, 0), z_dir=(0, 0, -1))) as chamfer6_piece_8:
        Polygon((CHAMFER6_SIZE * 0.999621916911, CHAMFER6_SIZE * 0.0274958766106), (-CHAMFER6_SIZE * 0.0274958766106, CHAMFER6_SIZE * 0.999621916911), (0, 0), align=None)
    extrude(amount=30.143365976, mode=Mode.SUBTRACT)
    with BuildSketch(Plane(origin=(-33.893365976, -3, 30), x_dir=(0, -0.9996219169112968, 0.027495876610585432), z_dir=(1, 0, 0)), Plane(origin=(-15.356634024, 3, 30), x_dir=(0, 0.9996219169112968, 0.027495876610585716), z_dir=(-1, 0, 0))) as chamfer6_piece_9:
        Polygon((CHAMFER6_SIZE * 0.999621916911, CHAMFER6_SIZE * 0.0274958766106), (-CHAMFER6_SIZE * 0.0274958766106, CHAMFER6_SIZE * 0.999621916911), (0, 0), align=None)
    extrude(amount=18.536731952, mode=Mode.SUBTRACT)
    with BuildSketch(Plane(origin=(-28.75, 15, -0.143365976), x_dir=(-0.027495876610585623, -0.9996219169112968, 0), z_dir=(0, 0, 1))) as chamfer6_piece_10:
        Polygon((CHAMFER6_SIZE * 0.999621916911, CHAMFER6_SIZE * 0.0274958766106), (-CHAMFER6_SIZE * 0.0274958766106, CHAMFER6_SIZE * 0.999621916911), (0, 0), align=None)
    extrude(amount=30.286731952, mode=Mode.SUBTRACT)
    with BuildSketch(Plane(origin=(-28.75, 6.36309104, 33.63690896), x_dir=(0.9996219169112968, 0.019442520806021366, 0.019442520806005816), z_dir=(0, 0.7071067811862648, -0.7071067811868302))) as chamfer6_piece_11:
        Polygon((CHAMFER6_SIZE * 0.999621916911, CHAMFER6_SIZE * 0.0274958766106), (-CHAMFER6_SIZE * 0.0274958766106, CHAMFER6_SIZE * 0.999621916911), (0, 0), align=None)
    extrude(amount=17.357799764, mode=Mode.SUBTRACT)
    with BuildSketch(Plane(origin=(-28.75, 15.143365976, 30), x_dir=(-0.0274958766105856, 0, -0.9996219169112968), z_dir=(0, -1, 0))) as chamfer6_piece_12:
        Polygon((CHAMFER6_SIZE * 0.999621916911, CHAMFER6_SIZE * 0.0274958766106), (-CHAMFER6_SIZE * 0.0274958766106, CHAMFER6_SIZE * 0.999621916911), (0, 0), align=None)
    extrude(amount=17.286731952, mode=Mode.SUBTRACT)

    # Chamfer7
    # the kernel refuses this chamfer: 2.5, 1.767766953 mm, written as the material it adds along each edge
    # the kernel refuses this chamfer: 2.5, 1.767766953 mm, written as the material it takes off along each edge
    with BuildSketch(Plane(origin=(-28.75, 5, 5), x_dir=(0.9996219169112968, 0, 0.027495876610586317), z_dir=(0, -1, 0))) as chamfer7_2_piece_1_section:
        Polygon((CHAMFER7_SIZE * 0.999621916911, -CHAMFER7_SIZE * 0.0274958766106), (CHAMFER7_SIZE_2 * 0.687396915251, -CHAMFER7_SIZE_2 * 0.726281956863), (0, 0), align=None)
    chamfer7_2_piece_1 = extrude(amount=10, mode=Mode.PRIVATE)
    chamfer7_2_piece_1 = split(chamfer7_2_piece_1, bisect_by=Plane(origin=(-27.555267467, 3.805267467, 4.588427948), z_dir=(-0.7071067811862649, -0.7071067811868302, 0)), keep=Keep.TOP, mode=Mode.PRIVATE)
    chamfer7_2_piece_1 = split(chamfer7_2_piece_1, bisect_by=Plane(origin=(-24.018422489, -0.268422489, 4.588427948), z_dir=(-0.7071067811862649, 0.7071067811868302, 0)), keep=Keep.TOP, mode=Mode.PRIVATE)
    add(chamfer7_2_piece_1, mode=Mode.SUBTRACT)
    with BuildSketch(Plane(origin=(-28.75, 5, 5), x_dir=(0.9996219169112968, 0, 0.027495876610586317), z_dir=(0, -1, 0))) as chamfer7_2_piece_2_section:
        Polygon((CHAMFER7_SIZE * 0.999621916911, -CHAMFER7_SIZE * 0.0274958766106), (CHAMFER7_SIZE_2 * 0.687396915251, -CHAMFER7_SIZE_2 * 0.726281956863), (0, 0), align=None)
    chamfer7_2_piece_2 = extrude(amount=10, mode=Mode.PRIVATE)
    chamfer7_2_piece_2 = split(chamfer7_2_piece_2, bisect_by=Plane(origin=(-26.5, -3, 4.875), z_dir=(0, 1, 0)), keep=Keep.TOP, mode=Mode.PRIVATE)
    chamfer7_2_piece_2 = split(chamfer7_2_piece_2, bisect_by=Plane(origin=(-26.5, 3, 4.875), z_dir=(0, -1, 0)), keep=Keep.TOP, mode=Mode.PRIVATE)
    add(chamfer7_2_piece_2, mode=Mode.SUBTRACT)

    # Chamfer8: one chamfer whose edges measure the first distance from different faces: ONE call of the kernel's chamfer builder (chamfer() names one face for all edges)
    chamfer8_edges_1 = [part.edges().sort_by_distance(p)[0] for p in [
        (66.25, 7.823460599, 15),
    ]]
    chamfer8_side_1 = [part.faces().sort_by_distance(p)[0] for p in [
        (52.5, 1.4117303, 15),
    ]]
    chamfer8_edges_2 = [part.edges().sort_by_distance(p)[0] for p in [
        (38.75, -5, 15),
    ]]
    chamfer8_side_2 = [part.faces().sort_by_distance(p)[0] for p in [
        (38.75, 0, 15),
    ]]
    chamfer8_edges_3 = [part.edges().sort_by_distance(p)[0] for p in [
        (38.75, 5, 15),
    ]]
    chamfer8_side_3 = [part.faces().sort_by_distance(p)[0] for p in [
        (48.75, 9.663076582, 15),
    ]]
    chamfer8 = BRepFilletAPI_MakeChamfer(part.part.solid().wrapped)
    for e in chamfer8_edges_1:
        chamfer8.Add(CHAMFER8_SIZE, CHAMFER8_SIZE2, e.wrapped, chamfer8_side_1[0].wrapped)  # the first distance lies on this face
    for e in chamfer8_edges_2:
        chamfer8.Add(CHAMFER8_SIZE, CHAMFER8_SIZE2_2, e.wrapped, chamfer8_side_2[0].wrapped)  # the first distance lies on this face
    for e in chamfer8_edges_3:
        chamfer8.Add(CHAMFER8_SIZE, CHAMFER8_SIZE2_3, e.wrapped, chamfer8_side_3[0].wrapped)  # the first distance lies on this face
    add(Compound.cast(chamfer8.Shape()), mode=Mode.REPLACE)

    # Sketch19 → Cut-Extrude12 (cut)
    with BuildSketch(Plane.XY.offset(30)):
        with Locations((52.344616806, 6.339273926)):
            Circle(SKETCH19_R)
    extrude(amount=-CUT_EXTRUDE12_DEPTH, mode=Mode.SUBTRACT)

    # Sketch20 → Cut-Extrude13 (cut)
    with BuildSketch(Plane.XY.offset(5)):
        with Locations((-10, 0)):
            Circle(SKETCH20_R)
    extrude(amount=-CUT_EXTRUDE13_DEPTH, mode=Mode.SUBTRACT)


solid = part.part
